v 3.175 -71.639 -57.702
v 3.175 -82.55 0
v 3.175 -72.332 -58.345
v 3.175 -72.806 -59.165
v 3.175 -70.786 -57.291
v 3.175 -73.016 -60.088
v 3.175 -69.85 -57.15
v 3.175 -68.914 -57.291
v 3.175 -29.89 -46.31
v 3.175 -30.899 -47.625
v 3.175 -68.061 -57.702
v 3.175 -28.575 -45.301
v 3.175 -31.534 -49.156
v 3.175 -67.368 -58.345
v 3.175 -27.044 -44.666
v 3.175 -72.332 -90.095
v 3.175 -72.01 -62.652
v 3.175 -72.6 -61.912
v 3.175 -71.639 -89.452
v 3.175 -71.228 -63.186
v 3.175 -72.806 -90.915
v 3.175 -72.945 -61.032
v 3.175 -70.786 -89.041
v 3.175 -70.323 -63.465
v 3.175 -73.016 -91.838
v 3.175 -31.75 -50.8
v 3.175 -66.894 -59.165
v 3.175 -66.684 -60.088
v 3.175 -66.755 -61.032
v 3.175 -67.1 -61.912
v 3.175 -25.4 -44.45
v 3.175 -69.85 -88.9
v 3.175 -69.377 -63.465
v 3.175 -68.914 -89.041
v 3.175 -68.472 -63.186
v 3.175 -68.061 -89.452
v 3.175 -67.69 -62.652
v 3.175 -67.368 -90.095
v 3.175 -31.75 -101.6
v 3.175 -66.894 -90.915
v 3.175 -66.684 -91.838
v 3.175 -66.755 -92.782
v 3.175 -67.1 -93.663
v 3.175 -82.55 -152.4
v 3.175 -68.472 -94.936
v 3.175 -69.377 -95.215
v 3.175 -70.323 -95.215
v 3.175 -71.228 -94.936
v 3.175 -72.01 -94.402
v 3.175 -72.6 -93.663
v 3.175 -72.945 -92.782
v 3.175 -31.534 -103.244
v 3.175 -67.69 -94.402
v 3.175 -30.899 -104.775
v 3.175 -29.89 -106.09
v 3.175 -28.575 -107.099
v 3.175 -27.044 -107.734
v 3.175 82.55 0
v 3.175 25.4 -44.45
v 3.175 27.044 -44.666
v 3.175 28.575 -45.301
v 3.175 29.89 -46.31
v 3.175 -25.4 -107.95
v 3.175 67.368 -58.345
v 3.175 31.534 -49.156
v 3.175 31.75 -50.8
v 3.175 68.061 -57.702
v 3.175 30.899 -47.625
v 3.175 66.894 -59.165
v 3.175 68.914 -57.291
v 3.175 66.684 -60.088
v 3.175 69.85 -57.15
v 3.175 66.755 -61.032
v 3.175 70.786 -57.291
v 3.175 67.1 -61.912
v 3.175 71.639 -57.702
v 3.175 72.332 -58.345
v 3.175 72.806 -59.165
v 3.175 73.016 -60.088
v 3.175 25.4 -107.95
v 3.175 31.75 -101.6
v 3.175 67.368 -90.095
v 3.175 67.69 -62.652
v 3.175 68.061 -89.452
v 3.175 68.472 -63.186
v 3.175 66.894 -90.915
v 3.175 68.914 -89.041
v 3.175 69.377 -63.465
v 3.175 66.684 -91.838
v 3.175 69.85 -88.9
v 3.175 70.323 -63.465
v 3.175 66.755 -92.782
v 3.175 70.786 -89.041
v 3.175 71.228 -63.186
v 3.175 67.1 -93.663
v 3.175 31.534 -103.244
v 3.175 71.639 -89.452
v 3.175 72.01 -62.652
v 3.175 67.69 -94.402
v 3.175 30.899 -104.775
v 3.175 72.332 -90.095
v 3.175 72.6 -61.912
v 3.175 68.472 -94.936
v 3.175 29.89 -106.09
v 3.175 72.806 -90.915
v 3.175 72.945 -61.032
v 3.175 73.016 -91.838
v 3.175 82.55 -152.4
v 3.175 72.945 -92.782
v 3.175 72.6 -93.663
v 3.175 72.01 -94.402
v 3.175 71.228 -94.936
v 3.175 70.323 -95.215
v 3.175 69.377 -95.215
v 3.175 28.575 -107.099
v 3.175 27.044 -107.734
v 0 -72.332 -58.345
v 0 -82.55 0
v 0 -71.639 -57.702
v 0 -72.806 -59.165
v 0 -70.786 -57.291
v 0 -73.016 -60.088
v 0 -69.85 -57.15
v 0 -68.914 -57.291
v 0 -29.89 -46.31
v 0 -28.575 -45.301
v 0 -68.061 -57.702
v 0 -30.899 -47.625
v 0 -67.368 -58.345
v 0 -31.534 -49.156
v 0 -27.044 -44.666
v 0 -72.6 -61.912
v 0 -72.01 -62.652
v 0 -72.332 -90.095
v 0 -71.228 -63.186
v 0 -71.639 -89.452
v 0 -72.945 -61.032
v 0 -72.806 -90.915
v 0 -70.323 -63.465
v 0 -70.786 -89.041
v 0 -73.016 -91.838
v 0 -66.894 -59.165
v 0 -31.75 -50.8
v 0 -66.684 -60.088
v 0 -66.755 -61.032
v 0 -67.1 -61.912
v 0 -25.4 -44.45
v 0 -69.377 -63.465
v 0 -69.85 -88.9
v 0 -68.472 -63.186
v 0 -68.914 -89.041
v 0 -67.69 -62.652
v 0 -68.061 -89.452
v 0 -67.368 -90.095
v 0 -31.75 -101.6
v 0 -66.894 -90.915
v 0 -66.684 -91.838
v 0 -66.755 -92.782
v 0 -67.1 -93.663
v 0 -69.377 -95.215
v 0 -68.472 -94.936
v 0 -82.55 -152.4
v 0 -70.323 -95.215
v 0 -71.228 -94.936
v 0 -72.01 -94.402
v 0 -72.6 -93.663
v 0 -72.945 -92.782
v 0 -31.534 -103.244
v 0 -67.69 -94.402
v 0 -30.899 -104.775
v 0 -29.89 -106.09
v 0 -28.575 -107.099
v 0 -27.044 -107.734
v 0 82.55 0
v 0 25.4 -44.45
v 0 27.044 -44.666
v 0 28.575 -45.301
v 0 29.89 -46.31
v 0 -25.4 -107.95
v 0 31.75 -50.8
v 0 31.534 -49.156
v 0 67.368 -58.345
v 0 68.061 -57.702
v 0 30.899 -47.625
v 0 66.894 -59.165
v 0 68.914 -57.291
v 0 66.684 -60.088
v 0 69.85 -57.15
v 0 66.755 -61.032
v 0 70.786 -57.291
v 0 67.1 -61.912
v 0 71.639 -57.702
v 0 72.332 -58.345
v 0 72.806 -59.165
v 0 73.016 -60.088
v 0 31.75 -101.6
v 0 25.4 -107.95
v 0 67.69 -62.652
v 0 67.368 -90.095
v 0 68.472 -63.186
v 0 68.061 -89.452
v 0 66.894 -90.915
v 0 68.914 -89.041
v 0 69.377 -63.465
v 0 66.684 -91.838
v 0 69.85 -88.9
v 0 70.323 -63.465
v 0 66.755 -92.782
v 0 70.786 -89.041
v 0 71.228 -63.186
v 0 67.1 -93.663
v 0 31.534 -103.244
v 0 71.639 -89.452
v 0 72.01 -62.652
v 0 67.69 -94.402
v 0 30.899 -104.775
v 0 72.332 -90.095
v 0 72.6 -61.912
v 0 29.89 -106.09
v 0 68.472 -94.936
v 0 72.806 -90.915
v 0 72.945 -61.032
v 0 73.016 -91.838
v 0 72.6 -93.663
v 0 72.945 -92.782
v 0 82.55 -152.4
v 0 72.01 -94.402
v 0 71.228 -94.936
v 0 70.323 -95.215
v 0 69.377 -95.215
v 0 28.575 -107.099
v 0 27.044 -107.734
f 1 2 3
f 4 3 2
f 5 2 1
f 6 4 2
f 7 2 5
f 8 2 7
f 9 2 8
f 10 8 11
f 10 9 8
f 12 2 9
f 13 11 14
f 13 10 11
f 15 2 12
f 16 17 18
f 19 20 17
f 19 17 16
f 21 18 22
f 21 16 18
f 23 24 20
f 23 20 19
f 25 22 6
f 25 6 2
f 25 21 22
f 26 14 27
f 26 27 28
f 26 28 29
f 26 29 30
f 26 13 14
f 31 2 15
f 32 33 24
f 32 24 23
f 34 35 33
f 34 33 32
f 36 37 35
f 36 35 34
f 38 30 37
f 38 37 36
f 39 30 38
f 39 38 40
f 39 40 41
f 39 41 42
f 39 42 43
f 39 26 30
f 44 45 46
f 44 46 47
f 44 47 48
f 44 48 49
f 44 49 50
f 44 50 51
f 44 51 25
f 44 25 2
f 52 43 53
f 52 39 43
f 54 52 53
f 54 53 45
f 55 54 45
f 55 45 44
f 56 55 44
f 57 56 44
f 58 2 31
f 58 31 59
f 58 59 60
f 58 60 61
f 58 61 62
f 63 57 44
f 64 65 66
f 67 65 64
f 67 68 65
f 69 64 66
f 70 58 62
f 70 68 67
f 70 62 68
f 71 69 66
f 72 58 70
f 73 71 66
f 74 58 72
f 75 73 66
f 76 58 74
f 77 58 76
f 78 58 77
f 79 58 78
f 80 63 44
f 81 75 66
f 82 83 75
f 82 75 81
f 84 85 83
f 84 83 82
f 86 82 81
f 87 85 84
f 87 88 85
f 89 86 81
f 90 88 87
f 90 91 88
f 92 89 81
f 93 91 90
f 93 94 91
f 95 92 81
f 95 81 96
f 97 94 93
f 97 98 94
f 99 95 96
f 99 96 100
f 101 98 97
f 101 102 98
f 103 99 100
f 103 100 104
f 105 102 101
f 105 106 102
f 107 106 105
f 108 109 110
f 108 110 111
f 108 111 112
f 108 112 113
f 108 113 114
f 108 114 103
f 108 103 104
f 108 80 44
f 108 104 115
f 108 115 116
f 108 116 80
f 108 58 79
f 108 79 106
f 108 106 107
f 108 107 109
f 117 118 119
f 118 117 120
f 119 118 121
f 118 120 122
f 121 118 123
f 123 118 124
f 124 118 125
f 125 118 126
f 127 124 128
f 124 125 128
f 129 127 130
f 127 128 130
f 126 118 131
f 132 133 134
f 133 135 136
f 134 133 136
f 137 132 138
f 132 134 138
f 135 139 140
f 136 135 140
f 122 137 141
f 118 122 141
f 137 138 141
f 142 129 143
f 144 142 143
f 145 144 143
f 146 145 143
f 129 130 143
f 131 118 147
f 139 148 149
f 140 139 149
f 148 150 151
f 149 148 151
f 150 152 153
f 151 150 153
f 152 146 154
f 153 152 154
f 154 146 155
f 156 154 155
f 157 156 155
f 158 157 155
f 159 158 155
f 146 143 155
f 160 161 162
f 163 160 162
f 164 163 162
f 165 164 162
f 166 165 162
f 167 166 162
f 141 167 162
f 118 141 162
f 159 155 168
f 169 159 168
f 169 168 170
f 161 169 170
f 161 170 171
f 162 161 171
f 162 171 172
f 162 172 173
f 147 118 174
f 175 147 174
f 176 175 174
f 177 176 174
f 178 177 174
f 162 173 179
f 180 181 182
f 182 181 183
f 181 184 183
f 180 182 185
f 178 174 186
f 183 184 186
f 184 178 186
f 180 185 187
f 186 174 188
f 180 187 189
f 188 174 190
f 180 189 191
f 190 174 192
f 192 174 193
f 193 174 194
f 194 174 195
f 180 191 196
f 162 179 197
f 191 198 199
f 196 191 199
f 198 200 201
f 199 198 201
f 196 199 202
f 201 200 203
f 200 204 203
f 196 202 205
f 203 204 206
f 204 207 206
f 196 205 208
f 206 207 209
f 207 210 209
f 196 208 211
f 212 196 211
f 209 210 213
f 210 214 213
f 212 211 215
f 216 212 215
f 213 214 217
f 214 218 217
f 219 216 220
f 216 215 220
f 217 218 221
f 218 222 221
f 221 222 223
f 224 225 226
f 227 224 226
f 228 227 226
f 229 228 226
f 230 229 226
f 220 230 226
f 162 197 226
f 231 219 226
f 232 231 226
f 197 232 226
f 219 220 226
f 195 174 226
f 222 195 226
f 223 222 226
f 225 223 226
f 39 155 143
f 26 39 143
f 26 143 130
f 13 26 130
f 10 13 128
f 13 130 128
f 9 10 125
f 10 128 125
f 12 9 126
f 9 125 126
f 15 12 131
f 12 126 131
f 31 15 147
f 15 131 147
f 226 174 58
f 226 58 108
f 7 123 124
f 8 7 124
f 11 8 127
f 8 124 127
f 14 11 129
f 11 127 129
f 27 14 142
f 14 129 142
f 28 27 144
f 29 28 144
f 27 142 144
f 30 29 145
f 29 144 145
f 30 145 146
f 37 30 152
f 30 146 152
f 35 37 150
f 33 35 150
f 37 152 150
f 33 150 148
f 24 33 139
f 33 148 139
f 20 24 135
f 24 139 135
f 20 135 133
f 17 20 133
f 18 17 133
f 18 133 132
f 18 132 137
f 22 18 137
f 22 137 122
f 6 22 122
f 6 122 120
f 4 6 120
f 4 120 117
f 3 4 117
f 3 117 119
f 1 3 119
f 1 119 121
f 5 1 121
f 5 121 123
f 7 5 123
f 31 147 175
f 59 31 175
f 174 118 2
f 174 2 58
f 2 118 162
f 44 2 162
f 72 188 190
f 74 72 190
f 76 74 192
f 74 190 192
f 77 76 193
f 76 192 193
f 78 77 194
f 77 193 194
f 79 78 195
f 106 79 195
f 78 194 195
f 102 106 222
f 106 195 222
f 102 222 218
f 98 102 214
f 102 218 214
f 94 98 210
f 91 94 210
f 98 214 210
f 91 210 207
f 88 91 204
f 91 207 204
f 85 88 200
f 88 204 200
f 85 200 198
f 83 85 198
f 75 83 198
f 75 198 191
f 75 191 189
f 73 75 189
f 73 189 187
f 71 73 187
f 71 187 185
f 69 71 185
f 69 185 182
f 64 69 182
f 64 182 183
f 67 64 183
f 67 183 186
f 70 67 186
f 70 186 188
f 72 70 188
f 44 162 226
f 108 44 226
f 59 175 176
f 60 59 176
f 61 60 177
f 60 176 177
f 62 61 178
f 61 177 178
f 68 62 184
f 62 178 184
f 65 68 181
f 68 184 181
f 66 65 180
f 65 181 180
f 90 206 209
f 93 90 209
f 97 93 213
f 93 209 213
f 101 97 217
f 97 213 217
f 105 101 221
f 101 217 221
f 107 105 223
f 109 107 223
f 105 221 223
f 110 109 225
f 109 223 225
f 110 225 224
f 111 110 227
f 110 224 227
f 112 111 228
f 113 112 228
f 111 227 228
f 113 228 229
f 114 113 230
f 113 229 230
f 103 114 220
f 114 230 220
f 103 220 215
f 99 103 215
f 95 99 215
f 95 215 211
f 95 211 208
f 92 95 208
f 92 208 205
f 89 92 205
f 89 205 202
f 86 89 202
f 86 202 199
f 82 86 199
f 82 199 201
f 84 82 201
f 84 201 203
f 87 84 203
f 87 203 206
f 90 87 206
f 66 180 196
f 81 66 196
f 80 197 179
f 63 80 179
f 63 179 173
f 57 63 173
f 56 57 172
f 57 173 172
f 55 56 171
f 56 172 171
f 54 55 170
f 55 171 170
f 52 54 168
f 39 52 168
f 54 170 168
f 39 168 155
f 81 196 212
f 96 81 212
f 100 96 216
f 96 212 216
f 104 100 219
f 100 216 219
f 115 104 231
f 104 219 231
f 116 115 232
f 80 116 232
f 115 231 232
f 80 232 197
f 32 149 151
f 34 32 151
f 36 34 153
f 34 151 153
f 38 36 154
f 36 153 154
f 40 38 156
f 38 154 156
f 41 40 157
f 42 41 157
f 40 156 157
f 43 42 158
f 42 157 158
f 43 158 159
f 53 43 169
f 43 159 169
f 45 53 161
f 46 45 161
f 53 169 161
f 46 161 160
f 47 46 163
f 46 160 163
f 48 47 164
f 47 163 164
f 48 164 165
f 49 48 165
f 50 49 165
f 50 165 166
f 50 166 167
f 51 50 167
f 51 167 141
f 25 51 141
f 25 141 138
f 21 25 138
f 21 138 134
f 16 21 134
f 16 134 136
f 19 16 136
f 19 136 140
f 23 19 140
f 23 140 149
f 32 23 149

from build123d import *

# Parameters (mm, degrees)
SKETCH1_W           = 152.4
SKETCH1_H           = 165.1
BOSS_EXTRUDE1_DEPTH = 3.175
CUT_EXTRUDE1_DEPTH  = 4.175
SKETCH3_R           = 3.175
CUT_EXTRUDE2_DEPTH  = 4.175


with BuildPart() as part:
    # Sketch1 → Boss-Extrude1 (new body)
    with BuildSketch(Plane(origin=(0, 0, 0), x_dir=(0, 0, -1), z_dir=(1, 0, 0))):
        with Locations((76.2, 0)):
            Rectangle(SKETCH1_W, SKETCH1_H)
    extrude(amount=BOSS_EXTRUDE1_DEPTH)

    # Sketch2 → Cut-Extrude1 (cut, through all)
    with BuildSketch(Plane.ZY):
        with BuildLine():
            Line((-107.95, 25.4), (-107.95, -25.4))
            ThreePointArc((-107.95, -25.4), (-106.090128061, -29.890128061), (-101.6, -31.75))
            Line((-101.6, -31.75), (-50.8, -31.75))
            ThreePointArc((-50.8, -31.75), (-46.309871939, -29.890128061), (-44.45, -25.4))
            Line((-44.45, -25.4), (-44.45, 25.4))
            ThreePointArc((-44.45, 25.4), (-46.309871939, 29.890128061), (-50.8, 31.75))
            Line((-50.8, 31.75), (-101.6, 31.75))
            ThreePointArc((-101.6, 31.75), (-106.090128061, 29.890128061), (-107.95, 25.4))
        make_face()
    extrude(amount=-CUT_EXTRUDE1_DEPTH, mode=Mode.SUBTRACT)

    # Sketch3 → Cut-Extrude2 (cut, through all)
    with BuildSketch(Plane.ZY):
        with Locations((-60.325, 69.85)):
            Circle(SKETCH3_R)
        with Locations((-92.075, 69.85)):
            Circle(SKETCH3_R)
        with Locations((-92.075, -69.85)):
            Circle(SKETCH3_R)
        with Locations((-60.325, -69.85)):
            Circle(SKETCH3_R)
    extrude(amount=-CUT_EXTRUDE2_DEPTH, mode=Mode.SUBTRACT)


solid = part.part
